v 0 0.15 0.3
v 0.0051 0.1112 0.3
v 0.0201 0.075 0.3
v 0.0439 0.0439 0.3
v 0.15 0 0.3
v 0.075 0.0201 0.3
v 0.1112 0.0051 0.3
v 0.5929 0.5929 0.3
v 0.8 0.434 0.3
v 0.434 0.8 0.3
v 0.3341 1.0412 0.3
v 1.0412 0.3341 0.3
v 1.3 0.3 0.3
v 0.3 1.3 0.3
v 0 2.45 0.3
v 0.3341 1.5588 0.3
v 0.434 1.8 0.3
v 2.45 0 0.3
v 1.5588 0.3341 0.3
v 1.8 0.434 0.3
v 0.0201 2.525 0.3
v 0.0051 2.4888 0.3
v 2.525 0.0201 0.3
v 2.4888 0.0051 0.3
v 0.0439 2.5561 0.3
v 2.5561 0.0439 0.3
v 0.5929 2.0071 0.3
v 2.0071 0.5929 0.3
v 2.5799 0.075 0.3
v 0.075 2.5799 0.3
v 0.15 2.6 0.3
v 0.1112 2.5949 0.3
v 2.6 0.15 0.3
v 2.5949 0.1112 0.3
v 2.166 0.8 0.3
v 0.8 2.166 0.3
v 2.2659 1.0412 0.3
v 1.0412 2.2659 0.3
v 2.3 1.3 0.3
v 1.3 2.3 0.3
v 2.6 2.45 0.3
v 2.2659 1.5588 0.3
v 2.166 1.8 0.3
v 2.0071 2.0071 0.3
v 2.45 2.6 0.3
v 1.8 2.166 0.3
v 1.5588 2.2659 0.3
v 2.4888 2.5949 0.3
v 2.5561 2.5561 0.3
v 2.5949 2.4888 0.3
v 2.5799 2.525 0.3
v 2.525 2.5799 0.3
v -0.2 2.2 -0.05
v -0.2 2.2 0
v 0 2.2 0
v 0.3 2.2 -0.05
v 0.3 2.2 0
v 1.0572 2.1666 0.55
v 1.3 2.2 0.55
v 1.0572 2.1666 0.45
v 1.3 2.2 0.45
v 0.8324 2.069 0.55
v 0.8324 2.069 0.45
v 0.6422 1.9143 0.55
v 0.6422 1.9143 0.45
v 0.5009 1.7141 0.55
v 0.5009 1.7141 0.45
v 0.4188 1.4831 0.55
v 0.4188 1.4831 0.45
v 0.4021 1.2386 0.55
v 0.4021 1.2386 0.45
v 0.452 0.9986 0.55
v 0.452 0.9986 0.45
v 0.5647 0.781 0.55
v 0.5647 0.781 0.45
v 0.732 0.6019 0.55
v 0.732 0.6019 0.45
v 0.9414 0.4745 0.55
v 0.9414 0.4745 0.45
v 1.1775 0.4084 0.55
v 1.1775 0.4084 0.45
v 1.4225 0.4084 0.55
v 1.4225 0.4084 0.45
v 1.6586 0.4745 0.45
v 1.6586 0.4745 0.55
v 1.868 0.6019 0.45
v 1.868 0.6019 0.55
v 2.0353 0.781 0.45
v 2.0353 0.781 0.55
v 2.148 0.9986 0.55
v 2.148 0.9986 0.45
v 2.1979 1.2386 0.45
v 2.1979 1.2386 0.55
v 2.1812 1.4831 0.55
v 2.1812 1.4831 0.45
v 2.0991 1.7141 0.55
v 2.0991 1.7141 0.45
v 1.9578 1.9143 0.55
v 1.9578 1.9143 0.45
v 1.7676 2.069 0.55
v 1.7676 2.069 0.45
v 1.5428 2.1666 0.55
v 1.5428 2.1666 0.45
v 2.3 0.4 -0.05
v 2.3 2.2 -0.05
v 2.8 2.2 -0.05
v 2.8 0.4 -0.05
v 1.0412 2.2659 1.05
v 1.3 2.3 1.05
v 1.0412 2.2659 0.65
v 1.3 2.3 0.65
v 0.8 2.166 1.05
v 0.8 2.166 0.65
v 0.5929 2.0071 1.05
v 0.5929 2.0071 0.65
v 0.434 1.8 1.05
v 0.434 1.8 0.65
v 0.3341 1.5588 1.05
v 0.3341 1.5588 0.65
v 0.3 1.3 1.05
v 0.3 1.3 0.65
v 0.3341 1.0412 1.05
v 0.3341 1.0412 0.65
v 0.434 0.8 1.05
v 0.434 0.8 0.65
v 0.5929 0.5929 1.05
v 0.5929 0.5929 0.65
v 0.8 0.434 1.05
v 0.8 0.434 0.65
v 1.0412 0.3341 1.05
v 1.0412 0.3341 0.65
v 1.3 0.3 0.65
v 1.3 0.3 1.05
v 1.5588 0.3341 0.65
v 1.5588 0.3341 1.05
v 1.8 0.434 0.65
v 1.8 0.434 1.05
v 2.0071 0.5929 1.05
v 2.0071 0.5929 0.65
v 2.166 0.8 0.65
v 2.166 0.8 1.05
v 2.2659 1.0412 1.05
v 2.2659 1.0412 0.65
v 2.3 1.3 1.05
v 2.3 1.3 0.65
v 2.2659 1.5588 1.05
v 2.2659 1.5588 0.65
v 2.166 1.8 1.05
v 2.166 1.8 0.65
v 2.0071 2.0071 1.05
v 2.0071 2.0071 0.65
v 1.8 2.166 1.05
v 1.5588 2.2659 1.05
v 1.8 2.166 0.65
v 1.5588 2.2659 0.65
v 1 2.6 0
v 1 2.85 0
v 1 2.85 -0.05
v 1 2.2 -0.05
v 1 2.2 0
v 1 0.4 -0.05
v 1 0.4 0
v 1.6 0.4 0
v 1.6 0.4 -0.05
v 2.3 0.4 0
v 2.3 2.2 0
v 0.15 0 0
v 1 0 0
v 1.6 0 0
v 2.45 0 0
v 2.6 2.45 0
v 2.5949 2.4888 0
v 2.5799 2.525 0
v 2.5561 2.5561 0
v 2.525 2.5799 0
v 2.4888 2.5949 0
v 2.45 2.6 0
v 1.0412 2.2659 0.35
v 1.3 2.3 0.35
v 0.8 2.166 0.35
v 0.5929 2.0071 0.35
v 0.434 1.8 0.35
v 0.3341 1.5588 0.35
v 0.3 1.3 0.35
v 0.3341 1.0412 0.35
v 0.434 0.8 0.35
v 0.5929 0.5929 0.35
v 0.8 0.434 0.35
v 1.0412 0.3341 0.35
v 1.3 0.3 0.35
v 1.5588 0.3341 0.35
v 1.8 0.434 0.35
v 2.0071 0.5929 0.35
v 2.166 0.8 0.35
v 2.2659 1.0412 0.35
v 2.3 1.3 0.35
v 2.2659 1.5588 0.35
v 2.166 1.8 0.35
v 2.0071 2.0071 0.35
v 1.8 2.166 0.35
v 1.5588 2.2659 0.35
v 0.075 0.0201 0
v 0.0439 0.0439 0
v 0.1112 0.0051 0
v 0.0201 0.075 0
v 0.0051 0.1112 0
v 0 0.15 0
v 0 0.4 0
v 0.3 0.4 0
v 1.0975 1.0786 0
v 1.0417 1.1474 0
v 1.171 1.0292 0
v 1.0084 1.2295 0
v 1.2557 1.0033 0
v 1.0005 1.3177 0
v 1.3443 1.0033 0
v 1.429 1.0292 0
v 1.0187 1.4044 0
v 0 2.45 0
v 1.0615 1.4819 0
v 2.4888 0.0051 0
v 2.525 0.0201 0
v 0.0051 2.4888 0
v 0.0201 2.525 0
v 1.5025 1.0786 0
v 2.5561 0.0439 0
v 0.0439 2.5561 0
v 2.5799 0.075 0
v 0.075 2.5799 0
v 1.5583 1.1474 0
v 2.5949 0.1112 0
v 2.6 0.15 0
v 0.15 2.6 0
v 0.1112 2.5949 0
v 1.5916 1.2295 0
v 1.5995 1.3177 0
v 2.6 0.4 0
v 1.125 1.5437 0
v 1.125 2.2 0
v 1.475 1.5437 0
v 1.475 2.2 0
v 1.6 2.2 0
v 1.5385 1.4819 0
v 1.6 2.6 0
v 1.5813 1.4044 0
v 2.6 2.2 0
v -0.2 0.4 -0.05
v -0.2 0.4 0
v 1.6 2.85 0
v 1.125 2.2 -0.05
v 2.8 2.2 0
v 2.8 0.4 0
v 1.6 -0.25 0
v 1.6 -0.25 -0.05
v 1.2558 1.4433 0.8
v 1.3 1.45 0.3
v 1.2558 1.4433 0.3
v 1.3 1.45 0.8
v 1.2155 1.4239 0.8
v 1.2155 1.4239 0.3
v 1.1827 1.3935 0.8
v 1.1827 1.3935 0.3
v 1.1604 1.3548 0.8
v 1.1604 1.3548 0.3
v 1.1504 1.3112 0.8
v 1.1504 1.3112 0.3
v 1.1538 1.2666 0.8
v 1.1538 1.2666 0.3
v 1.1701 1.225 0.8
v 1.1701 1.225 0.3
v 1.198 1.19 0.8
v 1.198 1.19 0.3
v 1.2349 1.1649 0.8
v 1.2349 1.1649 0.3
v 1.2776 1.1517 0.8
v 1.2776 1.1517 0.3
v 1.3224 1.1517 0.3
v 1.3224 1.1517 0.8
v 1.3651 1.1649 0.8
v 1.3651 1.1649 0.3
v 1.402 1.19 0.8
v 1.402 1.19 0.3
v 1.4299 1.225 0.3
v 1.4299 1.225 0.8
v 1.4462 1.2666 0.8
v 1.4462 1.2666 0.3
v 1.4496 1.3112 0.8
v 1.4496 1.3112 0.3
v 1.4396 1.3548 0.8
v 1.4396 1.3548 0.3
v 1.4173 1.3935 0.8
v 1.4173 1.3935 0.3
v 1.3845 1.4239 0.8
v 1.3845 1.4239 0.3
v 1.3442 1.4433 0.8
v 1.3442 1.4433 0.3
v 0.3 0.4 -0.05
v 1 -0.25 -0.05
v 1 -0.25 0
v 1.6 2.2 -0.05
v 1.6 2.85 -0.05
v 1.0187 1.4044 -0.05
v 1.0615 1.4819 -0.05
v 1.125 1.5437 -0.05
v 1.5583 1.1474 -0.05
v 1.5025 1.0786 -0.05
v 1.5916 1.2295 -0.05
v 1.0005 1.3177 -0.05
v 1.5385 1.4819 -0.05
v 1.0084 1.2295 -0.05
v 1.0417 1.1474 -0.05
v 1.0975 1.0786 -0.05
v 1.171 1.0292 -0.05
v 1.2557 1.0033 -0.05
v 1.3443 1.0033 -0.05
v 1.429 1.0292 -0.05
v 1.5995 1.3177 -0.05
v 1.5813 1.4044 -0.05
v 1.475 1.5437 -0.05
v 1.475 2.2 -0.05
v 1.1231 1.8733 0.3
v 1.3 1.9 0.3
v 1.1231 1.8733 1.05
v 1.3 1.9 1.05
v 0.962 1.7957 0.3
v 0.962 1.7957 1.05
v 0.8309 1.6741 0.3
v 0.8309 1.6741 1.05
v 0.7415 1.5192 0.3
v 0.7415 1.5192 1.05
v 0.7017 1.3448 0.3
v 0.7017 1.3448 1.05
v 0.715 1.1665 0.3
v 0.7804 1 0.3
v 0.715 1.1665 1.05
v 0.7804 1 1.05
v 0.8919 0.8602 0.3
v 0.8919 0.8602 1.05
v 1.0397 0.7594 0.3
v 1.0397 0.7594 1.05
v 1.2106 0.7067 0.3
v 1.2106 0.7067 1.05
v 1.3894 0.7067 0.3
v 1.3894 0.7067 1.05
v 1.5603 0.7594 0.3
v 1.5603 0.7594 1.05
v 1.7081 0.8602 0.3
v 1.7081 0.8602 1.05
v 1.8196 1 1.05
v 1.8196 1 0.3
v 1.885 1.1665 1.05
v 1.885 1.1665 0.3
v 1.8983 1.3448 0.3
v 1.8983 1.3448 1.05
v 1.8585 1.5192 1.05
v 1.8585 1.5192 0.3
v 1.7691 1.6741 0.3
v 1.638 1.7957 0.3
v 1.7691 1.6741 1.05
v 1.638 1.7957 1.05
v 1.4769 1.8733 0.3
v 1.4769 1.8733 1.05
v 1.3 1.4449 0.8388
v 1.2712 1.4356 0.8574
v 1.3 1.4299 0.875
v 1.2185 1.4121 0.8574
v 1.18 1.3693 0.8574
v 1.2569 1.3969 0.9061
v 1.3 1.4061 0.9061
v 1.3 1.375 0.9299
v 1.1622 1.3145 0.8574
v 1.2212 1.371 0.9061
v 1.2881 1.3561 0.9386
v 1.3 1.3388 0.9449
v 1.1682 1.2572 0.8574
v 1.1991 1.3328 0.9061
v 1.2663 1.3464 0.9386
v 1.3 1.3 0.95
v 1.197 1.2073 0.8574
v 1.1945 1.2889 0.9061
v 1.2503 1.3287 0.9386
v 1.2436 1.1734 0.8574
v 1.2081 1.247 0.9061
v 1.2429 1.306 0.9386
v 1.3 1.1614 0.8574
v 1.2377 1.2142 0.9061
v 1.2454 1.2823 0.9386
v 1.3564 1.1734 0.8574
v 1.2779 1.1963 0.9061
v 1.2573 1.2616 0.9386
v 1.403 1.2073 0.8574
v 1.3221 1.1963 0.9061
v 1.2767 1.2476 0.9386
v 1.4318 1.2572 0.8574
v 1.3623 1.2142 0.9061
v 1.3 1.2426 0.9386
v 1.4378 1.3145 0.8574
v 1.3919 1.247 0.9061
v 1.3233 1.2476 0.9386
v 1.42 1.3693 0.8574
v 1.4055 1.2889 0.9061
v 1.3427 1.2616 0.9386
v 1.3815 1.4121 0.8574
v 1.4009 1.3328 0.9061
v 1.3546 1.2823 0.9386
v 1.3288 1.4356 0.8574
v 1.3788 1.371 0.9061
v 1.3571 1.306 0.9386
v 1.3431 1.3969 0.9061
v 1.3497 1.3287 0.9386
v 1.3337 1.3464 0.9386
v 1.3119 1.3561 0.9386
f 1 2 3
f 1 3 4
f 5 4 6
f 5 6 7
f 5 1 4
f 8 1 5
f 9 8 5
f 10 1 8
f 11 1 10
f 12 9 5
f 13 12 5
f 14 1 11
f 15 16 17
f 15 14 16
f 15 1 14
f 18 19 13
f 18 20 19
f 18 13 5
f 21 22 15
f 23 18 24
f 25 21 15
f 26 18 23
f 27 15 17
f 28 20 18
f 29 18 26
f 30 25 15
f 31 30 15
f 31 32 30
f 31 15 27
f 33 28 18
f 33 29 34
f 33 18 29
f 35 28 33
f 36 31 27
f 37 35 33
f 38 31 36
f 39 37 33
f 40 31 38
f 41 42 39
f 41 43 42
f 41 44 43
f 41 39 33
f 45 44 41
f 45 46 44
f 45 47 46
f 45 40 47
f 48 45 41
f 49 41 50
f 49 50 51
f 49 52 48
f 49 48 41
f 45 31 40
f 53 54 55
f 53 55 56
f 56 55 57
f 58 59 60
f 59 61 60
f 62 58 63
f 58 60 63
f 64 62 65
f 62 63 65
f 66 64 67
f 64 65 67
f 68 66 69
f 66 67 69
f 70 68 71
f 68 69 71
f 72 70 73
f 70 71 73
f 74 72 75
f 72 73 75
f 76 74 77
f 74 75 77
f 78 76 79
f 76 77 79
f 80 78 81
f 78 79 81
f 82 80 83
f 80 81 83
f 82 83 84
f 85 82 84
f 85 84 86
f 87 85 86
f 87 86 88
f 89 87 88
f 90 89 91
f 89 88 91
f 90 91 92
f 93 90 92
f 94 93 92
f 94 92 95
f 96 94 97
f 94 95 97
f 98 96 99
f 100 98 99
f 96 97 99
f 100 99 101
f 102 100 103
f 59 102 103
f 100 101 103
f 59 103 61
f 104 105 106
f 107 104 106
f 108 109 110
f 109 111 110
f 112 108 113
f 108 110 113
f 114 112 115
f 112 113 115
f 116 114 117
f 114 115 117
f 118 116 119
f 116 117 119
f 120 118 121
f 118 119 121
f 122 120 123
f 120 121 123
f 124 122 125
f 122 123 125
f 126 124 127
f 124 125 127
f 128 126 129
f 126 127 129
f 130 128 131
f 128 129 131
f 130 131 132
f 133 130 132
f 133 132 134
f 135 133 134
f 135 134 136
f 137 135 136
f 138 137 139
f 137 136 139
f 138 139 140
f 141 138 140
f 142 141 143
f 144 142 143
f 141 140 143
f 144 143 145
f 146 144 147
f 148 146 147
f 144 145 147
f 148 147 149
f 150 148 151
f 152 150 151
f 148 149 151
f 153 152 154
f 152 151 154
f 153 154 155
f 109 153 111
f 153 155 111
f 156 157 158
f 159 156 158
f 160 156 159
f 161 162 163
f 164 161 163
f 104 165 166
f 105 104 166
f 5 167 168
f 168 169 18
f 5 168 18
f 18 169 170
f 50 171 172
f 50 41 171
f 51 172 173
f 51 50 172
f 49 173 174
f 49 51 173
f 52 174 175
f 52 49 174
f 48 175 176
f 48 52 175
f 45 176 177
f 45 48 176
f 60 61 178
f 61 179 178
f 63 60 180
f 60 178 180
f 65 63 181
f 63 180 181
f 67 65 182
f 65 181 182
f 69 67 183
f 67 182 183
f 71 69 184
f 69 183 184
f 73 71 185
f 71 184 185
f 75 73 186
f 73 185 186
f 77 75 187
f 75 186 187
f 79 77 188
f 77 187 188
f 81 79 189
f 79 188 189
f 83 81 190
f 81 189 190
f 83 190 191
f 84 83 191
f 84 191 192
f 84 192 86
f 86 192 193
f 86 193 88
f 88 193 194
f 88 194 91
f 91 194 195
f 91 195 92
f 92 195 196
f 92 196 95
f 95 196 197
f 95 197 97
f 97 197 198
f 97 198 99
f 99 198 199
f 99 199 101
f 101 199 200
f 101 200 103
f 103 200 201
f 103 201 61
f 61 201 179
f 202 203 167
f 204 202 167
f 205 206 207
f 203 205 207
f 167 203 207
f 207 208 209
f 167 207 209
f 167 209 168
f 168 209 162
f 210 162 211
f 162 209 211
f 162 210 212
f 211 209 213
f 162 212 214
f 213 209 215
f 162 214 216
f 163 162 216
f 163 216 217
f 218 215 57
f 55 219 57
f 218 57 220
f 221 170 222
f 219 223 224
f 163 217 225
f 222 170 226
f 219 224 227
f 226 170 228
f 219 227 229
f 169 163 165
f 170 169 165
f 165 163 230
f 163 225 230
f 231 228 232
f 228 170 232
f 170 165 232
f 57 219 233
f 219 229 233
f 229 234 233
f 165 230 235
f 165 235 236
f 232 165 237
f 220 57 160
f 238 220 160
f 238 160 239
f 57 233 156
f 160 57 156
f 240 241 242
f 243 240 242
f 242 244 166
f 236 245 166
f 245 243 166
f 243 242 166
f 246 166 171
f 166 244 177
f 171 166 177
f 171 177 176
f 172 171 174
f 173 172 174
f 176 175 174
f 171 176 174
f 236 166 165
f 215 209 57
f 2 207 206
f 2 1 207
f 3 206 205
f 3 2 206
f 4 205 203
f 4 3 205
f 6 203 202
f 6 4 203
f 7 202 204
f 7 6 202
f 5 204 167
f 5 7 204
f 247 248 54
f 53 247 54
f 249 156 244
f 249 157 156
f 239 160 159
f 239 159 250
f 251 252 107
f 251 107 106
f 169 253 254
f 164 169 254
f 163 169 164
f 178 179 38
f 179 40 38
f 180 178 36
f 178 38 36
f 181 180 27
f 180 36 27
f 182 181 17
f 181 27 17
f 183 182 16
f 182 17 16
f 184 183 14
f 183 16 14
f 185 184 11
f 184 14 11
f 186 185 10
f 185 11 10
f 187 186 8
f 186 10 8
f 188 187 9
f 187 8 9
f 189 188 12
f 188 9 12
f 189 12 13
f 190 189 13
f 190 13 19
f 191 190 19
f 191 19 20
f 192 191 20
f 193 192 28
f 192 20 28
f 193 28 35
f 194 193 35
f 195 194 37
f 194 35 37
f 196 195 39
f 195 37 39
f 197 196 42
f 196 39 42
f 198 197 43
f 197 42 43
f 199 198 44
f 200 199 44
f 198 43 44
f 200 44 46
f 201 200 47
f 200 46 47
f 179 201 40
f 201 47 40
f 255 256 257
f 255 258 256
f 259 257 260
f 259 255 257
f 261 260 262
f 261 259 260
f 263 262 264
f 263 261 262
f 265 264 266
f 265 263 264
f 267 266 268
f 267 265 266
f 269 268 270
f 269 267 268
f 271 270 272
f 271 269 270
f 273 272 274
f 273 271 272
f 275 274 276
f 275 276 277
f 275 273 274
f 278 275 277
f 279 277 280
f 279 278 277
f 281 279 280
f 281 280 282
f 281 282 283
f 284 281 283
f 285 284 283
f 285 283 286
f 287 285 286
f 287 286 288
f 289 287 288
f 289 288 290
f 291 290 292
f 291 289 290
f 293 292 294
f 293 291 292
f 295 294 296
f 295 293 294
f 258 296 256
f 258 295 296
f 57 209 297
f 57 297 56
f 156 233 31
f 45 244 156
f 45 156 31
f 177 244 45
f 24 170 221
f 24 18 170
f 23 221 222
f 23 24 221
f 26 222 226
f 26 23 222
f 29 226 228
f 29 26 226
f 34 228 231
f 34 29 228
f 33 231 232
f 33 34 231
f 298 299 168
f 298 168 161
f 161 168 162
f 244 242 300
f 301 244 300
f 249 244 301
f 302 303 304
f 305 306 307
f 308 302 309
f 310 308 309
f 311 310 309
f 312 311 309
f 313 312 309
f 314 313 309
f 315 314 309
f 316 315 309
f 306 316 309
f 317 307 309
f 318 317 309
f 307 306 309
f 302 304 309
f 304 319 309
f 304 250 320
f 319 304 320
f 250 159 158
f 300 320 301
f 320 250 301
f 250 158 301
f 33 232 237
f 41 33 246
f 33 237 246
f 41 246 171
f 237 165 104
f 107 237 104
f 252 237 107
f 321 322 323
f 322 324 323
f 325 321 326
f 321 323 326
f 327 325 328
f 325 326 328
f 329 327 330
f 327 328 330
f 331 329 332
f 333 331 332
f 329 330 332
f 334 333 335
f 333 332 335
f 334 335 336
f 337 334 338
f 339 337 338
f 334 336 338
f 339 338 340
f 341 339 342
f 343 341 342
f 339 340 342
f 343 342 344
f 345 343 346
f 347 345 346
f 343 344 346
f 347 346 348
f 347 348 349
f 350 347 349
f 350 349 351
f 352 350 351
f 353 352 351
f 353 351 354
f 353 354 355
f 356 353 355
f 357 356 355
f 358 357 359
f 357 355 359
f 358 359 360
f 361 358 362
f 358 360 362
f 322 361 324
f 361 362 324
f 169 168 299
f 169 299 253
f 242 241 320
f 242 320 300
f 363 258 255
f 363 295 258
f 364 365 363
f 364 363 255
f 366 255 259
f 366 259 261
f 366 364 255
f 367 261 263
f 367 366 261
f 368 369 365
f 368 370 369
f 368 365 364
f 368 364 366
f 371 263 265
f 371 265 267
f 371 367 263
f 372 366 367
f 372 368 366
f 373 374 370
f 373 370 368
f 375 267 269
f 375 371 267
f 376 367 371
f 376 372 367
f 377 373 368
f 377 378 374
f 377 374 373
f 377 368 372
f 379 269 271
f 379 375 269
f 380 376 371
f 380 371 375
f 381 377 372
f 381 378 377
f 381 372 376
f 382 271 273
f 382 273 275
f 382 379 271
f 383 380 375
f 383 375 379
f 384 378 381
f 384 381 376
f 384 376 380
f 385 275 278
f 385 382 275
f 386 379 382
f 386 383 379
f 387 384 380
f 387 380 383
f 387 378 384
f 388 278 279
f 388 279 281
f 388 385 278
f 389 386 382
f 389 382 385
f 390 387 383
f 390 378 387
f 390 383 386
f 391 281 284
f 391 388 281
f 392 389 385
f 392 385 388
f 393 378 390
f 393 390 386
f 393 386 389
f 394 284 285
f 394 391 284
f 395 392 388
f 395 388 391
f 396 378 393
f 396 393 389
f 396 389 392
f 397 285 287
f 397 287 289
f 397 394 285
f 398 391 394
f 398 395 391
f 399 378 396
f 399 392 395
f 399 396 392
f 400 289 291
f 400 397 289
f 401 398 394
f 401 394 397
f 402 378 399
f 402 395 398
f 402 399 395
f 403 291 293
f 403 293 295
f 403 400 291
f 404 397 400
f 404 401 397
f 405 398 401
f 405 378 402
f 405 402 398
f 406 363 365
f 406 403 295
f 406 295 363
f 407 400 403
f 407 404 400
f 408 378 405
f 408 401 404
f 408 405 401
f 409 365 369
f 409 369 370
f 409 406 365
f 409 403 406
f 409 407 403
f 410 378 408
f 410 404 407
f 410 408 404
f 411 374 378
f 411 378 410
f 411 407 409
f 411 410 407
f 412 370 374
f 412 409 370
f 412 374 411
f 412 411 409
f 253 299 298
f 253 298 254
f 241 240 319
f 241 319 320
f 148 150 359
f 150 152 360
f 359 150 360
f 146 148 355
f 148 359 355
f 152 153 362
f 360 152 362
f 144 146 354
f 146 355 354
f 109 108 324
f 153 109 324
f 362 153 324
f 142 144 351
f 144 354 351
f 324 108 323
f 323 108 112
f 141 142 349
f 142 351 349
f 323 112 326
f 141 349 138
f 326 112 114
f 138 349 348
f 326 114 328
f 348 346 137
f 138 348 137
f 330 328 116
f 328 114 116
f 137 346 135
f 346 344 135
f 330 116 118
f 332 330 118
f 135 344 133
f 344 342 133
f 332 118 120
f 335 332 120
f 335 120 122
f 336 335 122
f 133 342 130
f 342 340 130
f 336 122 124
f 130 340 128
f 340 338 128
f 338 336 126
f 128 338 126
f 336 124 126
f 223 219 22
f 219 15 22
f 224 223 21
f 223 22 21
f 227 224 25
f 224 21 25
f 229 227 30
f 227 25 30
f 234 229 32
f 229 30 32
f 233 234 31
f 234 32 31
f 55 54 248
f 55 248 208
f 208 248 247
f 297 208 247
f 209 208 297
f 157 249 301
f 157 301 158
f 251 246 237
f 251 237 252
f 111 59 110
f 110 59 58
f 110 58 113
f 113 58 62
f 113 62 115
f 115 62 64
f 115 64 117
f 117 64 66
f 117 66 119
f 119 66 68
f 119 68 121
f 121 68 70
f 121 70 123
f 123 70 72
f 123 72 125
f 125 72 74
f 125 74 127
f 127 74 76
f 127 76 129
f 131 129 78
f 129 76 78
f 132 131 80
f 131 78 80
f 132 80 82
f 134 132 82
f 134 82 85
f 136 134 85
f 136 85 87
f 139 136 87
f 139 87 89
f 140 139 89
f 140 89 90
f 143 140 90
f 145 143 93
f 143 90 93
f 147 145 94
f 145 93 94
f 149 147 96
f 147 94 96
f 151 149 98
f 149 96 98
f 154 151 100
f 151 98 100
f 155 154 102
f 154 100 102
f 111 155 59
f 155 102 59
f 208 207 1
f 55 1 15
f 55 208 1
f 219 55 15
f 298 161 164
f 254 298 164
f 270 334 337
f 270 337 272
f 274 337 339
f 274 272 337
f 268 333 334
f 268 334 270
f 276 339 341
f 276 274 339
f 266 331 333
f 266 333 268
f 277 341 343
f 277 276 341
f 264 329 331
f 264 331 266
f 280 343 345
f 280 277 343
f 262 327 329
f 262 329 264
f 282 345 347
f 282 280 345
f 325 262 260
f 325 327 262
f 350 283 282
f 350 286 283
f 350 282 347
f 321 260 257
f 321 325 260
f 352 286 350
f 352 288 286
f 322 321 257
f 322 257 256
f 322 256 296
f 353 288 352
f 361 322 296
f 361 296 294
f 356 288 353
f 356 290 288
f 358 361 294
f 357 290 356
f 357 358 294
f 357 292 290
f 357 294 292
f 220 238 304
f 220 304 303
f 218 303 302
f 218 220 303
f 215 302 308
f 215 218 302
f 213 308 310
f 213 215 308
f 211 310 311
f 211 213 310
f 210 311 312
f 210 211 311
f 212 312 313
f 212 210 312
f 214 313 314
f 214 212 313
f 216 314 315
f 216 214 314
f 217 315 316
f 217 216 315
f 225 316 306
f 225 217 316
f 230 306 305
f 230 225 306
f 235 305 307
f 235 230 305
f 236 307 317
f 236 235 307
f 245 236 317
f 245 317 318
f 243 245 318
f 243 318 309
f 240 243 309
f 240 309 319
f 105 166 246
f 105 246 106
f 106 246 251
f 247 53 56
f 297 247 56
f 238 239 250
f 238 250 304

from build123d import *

# Parameters (mm, degrees)
SKETCH2_W           = 2.6
SKETCH2_H           = 2.6
BOSS_EXTRUDE2_DEPTH = 0.3
FILLET1_R           = 0.15
SKETCH3_W           = 0.5
SKETCH3_H           = 1.8
SKETCH3_W_2         = 0.6
SKETCH3_H_2         = 0.65
BOSS_EXTRUDE3_DEPTH = 0.05


with BuildPart() as part:
    # Sketch2 → Boss-Extrude2 (new body)
    with BuildSketch(Plane.XY):
        with Locations((1.3, 1.3)):
            Rectangle(SKETCH2_W, SKETCH2_H)
    extrude(amount=BOSS_EXTRUDE2_DEPTH)

    # Fillet1
    fillet1_edges = [part.edges().sort_by_distance(p)[0] for p in [
        (0, 2.6, 0.15),
        (2.6, 2.6, 0.15),
        (2.6, 0, 0.15),
        (0, 0, 0.15),
    ]]
    fillet(fillet1_edges, radius=FILLET1_R)

    # Sketch3 → Boss-Extrude3 (add)
    with BuildSketch(Plane.XY):
        with Locations((0.05, 1.3)):
            Rectangle(SKETCH3_W, SKETCH3_H)
        with Locations((2.55, 1.3)):
            Rectangle(SKETCH3_W, SKETCH3_H)
        with BuildLine():
            Line((1.475, 2.2), (1.6, 2.2))
            Line((1.6, 2.2), (1.6, 2.85))
            Line((1.6, 2.85), (1, 2.85))
            Line((1, 2.85), (1, 2.2))
            Line((1, 2.2), (1.125, 2.2))
            Line((1.125, 2.2), (1.125, 1.543669859))
            ThreePointArc((1.125, 1.543669859), (1.3, 1), (1.475, 1.543669859))
            Line((1.475, 1.543669859), (1.475, 2.2))
        make_face()
        with Locations((1.3, 0.075)):
            Rectangle(SKETCH3_W_2, SKETCH3_H_2)
    extrude(amount=-BOSS_EXTRUDE3_DEPTH)

    # Sketch4 → Revolve1 (revolve)
    with BuildSketch(Plane(origin=(1.3, 0, 0), x_dir=(0, 0, -1), z_dir=(1, 0, 0))):
        with BuildLine():
            Line((-0.3, 1.45), (-0.8, 1.45))
            ThreePointArc((-0.8, 1.45), (-0.906066017, 1.406066017), (-0.95, 1.3))
            Line((-0.95, 1.3), (-0.3, 1.3))
            Line((-0.3, 1.3), (-0.3, 1.45))
        make_face()
        Polygon((-0.3, 1.9), (-1.05, 1.9), (-1.05, 2.3), (-0.65, 2.3), (-0.55, 2.2), (-0.45, 2.2), (-0.35, 2.3), (-0.3, 2.3), align=None)
    revolve(axis=Axis((1.3, 1.3, -0.060709098), (0, 0, 1)))


solid = part.part
